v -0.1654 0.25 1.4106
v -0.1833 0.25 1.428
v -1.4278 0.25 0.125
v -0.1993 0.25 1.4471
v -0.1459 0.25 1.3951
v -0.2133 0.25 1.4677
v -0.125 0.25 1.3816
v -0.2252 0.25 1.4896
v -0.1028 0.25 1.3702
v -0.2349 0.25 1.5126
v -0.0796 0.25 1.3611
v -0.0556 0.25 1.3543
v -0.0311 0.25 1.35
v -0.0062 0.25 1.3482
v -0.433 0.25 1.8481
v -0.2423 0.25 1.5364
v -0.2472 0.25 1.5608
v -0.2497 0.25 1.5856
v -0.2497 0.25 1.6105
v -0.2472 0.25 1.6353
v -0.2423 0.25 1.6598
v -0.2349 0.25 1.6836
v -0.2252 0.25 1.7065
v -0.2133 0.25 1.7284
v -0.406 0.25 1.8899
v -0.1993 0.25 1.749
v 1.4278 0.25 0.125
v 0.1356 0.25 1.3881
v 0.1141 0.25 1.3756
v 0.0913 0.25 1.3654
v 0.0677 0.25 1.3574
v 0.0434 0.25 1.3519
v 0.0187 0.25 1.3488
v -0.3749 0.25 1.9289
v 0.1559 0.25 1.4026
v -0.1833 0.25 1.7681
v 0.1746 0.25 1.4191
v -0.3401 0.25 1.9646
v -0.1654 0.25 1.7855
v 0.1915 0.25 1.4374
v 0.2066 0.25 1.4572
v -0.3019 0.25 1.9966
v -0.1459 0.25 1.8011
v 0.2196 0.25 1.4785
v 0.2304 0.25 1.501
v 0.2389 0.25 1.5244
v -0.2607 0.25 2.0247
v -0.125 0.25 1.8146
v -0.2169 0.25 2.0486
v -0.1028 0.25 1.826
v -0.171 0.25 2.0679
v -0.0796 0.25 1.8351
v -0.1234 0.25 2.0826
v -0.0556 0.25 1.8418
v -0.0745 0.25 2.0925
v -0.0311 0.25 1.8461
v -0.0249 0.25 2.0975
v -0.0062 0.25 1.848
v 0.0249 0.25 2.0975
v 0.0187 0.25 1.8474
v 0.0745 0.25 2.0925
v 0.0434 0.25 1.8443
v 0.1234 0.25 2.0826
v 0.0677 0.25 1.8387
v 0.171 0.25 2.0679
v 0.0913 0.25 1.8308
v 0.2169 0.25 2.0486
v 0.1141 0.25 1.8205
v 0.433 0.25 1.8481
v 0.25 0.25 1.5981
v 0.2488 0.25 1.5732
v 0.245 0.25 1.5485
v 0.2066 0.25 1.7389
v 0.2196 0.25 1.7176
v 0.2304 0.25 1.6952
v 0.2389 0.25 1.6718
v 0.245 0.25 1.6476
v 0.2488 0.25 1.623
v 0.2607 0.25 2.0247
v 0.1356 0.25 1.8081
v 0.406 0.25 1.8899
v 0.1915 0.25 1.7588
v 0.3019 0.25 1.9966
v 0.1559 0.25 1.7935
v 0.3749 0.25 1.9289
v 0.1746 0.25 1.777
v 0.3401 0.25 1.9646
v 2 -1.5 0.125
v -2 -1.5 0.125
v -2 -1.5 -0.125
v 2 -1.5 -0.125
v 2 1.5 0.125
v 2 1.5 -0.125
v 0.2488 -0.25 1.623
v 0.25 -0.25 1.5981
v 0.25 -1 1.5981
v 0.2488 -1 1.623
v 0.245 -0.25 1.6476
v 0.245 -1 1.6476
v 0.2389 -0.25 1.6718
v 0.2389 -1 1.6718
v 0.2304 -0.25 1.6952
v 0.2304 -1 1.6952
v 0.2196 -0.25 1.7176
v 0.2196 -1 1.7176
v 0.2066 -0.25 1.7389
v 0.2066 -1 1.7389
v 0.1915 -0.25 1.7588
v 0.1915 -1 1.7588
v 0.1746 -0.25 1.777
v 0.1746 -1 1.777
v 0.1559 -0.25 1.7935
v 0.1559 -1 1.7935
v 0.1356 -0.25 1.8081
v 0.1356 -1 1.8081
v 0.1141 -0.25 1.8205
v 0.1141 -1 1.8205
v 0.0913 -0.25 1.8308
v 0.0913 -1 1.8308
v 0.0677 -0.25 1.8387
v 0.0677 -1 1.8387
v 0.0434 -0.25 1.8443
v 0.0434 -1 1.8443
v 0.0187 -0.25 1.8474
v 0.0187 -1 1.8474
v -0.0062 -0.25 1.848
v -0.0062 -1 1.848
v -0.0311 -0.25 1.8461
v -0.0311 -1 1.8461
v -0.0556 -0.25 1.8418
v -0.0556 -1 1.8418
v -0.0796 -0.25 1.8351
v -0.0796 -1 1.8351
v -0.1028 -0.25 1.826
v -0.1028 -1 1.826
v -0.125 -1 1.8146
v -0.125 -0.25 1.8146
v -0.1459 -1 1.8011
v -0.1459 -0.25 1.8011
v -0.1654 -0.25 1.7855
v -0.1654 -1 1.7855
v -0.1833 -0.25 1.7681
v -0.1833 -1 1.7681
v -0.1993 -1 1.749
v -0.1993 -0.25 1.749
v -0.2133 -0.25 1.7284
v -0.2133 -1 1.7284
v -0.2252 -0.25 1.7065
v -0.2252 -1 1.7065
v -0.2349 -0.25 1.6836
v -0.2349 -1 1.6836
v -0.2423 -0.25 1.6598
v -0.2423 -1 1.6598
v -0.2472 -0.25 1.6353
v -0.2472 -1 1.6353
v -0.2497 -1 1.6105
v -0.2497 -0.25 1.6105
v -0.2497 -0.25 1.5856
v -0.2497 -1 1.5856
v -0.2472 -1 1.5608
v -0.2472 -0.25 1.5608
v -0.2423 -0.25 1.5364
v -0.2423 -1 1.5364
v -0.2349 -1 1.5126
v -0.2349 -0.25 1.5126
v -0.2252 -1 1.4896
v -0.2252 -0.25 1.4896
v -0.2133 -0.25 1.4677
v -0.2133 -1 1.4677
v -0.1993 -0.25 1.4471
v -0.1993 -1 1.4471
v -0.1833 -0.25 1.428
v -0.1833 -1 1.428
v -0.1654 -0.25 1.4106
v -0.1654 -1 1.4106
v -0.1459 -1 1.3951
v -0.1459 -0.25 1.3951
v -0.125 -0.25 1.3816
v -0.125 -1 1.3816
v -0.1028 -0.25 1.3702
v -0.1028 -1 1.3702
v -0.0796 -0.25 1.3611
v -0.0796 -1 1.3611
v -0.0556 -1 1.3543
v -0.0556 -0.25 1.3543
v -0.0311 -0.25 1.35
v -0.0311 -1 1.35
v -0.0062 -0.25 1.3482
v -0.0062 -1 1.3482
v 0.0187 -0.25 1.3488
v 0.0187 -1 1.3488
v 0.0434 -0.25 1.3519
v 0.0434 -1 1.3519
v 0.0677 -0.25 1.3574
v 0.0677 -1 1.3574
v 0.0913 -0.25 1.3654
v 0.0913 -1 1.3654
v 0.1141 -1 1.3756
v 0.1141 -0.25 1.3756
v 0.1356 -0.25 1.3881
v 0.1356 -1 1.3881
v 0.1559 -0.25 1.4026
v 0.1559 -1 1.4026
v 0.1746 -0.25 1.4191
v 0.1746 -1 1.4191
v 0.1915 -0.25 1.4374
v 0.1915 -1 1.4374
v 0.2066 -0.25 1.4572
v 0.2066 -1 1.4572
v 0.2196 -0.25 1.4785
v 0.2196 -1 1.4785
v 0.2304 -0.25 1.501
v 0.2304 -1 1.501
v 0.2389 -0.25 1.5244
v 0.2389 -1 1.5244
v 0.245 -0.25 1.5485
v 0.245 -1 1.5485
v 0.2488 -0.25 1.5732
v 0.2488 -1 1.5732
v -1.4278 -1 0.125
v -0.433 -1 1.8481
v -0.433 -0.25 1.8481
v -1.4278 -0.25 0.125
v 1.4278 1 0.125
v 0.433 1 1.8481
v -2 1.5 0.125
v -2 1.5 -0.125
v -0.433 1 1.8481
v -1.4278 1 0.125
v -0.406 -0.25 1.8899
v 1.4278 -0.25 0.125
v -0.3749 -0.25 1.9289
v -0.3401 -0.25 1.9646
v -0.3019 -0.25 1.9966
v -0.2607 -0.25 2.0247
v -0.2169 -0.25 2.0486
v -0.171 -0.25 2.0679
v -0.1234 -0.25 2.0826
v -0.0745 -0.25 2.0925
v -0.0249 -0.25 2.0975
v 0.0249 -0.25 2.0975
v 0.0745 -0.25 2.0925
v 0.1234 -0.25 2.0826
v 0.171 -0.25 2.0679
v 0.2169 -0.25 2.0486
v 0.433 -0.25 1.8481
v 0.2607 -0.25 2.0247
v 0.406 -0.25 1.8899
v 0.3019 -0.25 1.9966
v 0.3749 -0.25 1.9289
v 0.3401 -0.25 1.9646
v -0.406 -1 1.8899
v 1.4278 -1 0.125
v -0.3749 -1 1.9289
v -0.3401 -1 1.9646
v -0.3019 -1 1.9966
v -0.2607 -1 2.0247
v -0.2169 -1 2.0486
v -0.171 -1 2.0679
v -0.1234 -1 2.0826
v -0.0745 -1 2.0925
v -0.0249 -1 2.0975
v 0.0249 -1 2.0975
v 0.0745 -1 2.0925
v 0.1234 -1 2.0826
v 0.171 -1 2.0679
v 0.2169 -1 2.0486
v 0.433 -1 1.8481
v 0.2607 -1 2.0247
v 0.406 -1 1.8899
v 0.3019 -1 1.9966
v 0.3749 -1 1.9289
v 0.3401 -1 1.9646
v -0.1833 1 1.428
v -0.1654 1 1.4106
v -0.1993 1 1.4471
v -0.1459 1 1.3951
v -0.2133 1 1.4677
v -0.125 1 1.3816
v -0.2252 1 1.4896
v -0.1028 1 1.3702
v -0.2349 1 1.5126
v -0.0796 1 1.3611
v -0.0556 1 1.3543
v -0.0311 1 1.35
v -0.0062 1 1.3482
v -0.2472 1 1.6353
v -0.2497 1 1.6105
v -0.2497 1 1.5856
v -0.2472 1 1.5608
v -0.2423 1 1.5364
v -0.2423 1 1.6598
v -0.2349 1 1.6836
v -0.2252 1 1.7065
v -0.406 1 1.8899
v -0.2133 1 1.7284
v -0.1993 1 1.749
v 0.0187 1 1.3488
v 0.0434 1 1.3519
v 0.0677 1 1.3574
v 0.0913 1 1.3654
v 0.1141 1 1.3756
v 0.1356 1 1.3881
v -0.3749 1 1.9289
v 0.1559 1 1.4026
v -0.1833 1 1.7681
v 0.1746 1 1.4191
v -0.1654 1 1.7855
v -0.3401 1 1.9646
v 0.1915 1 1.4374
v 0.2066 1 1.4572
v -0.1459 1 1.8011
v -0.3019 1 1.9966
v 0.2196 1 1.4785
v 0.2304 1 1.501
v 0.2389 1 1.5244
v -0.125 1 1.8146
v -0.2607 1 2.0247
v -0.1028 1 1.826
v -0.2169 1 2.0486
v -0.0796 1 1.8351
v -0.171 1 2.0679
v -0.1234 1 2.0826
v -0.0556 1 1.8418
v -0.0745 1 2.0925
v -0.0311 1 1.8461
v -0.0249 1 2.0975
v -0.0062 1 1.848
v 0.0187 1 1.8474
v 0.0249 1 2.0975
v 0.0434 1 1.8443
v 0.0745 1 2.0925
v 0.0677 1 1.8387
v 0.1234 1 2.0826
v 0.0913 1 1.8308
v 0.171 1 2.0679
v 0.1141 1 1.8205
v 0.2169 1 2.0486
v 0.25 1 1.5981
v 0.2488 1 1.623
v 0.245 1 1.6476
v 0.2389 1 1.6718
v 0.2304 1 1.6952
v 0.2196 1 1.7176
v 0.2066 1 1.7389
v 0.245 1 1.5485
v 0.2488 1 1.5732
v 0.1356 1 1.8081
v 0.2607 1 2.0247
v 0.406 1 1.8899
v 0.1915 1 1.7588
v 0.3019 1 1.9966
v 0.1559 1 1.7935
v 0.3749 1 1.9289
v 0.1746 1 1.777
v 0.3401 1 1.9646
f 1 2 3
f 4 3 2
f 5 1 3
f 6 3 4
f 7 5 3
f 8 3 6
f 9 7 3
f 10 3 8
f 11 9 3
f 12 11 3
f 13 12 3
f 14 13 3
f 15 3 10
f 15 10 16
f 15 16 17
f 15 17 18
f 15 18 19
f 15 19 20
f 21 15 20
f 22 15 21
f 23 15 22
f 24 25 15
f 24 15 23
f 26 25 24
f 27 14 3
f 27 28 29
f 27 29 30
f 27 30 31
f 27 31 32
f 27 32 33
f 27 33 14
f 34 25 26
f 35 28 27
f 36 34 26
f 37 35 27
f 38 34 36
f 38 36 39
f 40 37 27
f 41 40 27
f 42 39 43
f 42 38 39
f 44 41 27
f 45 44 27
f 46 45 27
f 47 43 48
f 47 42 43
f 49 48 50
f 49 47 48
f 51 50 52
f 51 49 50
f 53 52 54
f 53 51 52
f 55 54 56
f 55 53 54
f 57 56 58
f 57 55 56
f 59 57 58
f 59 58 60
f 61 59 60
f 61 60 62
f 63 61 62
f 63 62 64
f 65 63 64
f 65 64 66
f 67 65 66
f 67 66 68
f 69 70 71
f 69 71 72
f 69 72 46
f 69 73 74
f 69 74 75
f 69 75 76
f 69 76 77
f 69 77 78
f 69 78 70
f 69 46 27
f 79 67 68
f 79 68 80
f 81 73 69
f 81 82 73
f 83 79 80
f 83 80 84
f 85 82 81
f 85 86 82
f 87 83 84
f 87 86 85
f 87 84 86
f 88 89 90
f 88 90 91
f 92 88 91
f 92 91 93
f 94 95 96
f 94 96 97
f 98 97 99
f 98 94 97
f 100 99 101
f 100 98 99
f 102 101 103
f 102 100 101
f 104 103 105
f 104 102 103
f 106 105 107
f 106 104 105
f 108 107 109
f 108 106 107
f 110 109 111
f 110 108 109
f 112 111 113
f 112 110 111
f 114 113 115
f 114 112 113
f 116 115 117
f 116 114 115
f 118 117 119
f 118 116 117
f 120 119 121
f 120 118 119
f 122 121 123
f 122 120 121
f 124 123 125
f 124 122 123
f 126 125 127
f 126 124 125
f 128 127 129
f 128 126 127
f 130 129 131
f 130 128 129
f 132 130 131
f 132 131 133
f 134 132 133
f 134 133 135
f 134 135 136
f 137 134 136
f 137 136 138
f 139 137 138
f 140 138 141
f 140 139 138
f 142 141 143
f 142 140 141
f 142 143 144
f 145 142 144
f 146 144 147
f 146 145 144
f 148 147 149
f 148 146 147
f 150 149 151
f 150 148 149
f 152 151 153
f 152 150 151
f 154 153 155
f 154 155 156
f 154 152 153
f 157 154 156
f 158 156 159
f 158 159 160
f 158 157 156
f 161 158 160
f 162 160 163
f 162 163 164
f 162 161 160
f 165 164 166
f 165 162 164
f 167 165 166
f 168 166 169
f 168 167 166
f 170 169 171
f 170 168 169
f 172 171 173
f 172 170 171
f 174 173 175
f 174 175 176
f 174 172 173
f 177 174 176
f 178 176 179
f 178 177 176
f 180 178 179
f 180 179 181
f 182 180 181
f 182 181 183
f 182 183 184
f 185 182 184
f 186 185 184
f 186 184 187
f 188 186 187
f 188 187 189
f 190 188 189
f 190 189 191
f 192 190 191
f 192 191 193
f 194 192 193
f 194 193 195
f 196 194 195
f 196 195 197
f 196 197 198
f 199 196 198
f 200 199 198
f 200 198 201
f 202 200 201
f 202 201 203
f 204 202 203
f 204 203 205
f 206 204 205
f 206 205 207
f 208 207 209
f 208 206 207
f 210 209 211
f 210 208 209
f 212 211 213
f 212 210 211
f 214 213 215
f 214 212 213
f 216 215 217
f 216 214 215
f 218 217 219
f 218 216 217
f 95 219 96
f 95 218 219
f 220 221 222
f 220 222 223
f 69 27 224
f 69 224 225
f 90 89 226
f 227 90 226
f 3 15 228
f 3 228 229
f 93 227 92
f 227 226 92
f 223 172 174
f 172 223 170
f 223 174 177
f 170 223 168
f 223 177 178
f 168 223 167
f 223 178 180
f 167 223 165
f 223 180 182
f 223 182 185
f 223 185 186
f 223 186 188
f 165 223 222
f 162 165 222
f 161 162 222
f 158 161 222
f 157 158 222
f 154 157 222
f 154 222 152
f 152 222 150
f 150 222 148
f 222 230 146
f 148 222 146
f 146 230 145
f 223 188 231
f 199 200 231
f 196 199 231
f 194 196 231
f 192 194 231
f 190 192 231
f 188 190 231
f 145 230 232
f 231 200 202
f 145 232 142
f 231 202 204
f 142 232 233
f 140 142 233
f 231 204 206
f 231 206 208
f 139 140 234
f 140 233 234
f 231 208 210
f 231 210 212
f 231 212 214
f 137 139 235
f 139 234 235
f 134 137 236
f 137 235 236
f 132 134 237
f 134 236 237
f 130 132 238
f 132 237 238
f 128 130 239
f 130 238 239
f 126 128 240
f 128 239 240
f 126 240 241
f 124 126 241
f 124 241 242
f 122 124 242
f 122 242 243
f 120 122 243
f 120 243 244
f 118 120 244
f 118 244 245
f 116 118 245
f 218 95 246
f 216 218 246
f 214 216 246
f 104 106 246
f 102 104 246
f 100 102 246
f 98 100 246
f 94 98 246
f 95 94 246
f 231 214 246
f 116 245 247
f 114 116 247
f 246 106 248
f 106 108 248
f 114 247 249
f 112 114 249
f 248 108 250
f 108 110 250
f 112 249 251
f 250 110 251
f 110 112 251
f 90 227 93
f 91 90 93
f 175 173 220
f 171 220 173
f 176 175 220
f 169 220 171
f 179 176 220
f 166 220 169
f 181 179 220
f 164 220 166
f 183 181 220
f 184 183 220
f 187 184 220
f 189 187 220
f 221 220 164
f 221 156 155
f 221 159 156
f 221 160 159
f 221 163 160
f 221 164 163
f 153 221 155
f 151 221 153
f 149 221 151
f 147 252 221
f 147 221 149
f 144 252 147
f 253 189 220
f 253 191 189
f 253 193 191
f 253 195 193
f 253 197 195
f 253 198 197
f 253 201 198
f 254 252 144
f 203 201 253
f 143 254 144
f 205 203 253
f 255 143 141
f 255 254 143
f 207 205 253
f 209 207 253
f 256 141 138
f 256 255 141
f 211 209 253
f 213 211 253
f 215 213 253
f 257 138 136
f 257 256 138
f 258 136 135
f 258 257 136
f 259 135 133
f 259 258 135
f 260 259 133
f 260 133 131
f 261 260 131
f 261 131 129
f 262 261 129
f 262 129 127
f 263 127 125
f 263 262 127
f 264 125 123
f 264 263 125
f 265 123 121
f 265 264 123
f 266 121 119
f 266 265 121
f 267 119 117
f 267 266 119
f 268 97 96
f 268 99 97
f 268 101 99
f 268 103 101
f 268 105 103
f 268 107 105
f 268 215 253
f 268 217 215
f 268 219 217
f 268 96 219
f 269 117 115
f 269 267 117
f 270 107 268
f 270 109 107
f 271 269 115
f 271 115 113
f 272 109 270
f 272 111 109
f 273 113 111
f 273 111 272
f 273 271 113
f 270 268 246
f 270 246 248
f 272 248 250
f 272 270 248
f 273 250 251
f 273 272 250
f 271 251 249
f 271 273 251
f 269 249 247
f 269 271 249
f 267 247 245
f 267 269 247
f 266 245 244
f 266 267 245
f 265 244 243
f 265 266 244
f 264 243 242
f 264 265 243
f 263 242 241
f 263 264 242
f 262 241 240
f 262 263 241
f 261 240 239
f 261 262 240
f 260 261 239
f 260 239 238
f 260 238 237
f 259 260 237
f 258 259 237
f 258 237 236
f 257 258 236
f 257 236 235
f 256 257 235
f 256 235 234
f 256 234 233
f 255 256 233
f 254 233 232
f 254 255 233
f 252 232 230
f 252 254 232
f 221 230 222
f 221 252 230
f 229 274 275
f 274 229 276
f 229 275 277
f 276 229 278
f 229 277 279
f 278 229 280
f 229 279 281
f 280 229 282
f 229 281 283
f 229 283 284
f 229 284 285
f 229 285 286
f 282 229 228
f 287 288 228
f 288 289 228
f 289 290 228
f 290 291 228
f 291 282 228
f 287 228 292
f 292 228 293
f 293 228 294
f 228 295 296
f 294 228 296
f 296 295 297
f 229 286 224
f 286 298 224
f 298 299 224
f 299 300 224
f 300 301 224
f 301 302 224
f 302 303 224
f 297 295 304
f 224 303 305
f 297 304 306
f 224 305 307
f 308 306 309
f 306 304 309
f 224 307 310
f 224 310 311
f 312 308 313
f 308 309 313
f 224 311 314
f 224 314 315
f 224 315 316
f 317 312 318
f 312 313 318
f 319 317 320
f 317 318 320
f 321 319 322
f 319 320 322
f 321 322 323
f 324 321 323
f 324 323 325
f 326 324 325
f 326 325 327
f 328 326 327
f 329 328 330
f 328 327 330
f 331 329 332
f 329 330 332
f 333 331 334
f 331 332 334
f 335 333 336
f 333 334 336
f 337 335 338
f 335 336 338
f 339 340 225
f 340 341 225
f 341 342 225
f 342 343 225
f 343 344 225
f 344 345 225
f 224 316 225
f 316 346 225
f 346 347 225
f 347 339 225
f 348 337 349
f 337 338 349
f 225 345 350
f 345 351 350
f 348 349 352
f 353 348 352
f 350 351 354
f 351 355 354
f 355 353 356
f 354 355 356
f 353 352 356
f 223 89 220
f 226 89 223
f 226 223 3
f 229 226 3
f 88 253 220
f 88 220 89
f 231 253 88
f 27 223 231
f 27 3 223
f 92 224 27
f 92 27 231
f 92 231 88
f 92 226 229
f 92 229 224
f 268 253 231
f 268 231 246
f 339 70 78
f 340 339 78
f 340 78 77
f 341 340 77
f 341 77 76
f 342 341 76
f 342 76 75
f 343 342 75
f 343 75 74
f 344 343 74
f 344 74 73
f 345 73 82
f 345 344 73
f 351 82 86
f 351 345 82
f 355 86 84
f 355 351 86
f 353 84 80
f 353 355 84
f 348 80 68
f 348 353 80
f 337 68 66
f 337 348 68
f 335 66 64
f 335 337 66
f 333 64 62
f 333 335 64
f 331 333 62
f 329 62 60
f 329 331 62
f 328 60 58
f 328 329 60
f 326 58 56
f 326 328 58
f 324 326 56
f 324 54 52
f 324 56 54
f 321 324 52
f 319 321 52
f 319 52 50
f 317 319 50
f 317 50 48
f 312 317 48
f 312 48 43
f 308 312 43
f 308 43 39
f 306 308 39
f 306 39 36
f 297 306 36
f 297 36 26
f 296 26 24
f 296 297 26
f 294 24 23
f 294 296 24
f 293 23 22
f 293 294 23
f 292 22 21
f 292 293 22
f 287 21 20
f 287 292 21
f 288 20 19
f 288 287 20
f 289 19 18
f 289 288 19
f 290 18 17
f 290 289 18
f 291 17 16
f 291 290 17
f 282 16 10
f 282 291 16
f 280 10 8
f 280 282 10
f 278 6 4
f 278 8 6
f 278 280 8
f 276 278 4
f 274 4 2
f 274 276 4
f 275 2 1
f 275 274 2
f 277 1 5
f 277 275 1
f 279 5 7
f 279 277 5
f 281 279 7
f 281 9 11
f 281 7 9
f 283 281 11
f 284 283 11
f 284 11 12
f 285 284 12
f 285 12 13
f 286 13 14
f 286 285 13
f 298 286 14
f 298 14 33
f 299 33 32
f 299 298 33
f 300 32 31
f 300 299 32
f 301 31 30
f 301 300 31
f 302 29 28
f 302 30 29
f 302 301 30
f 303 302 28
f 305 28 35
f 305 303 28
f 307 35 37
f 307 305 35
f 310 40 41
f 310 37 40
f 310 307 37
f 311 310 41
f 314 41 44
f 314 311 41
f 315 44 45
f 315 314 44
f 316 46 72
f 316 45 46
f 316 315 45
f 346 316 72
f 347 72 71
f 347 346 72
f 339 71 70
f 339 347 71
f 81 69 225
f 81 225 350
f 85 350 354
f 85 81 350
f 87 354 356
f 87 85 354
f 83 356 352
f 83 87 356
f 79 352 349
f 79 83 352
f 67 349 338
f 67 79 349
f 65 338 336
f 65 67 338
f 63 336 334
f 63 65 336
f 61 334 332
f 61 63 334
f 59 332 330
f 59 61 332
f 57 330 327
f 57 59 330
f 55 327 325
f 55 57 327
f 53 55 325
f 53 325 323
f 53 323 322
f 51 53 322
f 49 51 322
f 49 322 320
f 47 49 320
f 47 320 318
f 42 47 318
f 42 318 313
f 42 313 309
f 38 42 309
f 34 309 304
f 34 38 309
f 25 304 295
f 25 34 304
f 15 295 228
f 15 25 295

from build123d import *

# Parameters (mm, degrees)
F0_R     = 0.25
F1_DEPTH = 1
F2_W     = 4.116254
F2_H     = 0.5
F3_DEPTH = 12.5
F4_W     = 4
F4_H     = 3
F5_DEPTH = 0.125


with BuildPart() as f1:
    # F0 (on Front) → F1 (new body, symmetric)
    with BuildSketch(Plane.XZ):
        with BuildLine():
            Line((-0.433013, 1.848076), (-1.5, 0))
            Line((-1.5, 0), (1.5, 0))
            Line((1.5, 0), (0.433013, 1.848076))
            ThreePointArc((0.433013, 1.848076), (0, 2.098076), (-0.433013, 1.848076))
        make_face()
        with Locations((0, 1.598076)):
            Circle(F0_R, mode=Mode.SUBTRACT)
    extrude(amount=F1_DEPTH, both=True)

    # F2 (on Top) → F3 (cut, symmetric)
    with BuildSketch(Plane.XY):
        Rectangle(F2_W, F2_H)
    extrude(amount=F3_DEPTH, both=True, mode=Mode.SUBTRACT)

    # F4 (on Top) → F5 (join, symmetric)
    with BuildSketch(Plane.XY):
        Rectangle(F4_W, F4_H)
    extrude(amount=F5_DEPTH, both=True)


solid = f1.part
